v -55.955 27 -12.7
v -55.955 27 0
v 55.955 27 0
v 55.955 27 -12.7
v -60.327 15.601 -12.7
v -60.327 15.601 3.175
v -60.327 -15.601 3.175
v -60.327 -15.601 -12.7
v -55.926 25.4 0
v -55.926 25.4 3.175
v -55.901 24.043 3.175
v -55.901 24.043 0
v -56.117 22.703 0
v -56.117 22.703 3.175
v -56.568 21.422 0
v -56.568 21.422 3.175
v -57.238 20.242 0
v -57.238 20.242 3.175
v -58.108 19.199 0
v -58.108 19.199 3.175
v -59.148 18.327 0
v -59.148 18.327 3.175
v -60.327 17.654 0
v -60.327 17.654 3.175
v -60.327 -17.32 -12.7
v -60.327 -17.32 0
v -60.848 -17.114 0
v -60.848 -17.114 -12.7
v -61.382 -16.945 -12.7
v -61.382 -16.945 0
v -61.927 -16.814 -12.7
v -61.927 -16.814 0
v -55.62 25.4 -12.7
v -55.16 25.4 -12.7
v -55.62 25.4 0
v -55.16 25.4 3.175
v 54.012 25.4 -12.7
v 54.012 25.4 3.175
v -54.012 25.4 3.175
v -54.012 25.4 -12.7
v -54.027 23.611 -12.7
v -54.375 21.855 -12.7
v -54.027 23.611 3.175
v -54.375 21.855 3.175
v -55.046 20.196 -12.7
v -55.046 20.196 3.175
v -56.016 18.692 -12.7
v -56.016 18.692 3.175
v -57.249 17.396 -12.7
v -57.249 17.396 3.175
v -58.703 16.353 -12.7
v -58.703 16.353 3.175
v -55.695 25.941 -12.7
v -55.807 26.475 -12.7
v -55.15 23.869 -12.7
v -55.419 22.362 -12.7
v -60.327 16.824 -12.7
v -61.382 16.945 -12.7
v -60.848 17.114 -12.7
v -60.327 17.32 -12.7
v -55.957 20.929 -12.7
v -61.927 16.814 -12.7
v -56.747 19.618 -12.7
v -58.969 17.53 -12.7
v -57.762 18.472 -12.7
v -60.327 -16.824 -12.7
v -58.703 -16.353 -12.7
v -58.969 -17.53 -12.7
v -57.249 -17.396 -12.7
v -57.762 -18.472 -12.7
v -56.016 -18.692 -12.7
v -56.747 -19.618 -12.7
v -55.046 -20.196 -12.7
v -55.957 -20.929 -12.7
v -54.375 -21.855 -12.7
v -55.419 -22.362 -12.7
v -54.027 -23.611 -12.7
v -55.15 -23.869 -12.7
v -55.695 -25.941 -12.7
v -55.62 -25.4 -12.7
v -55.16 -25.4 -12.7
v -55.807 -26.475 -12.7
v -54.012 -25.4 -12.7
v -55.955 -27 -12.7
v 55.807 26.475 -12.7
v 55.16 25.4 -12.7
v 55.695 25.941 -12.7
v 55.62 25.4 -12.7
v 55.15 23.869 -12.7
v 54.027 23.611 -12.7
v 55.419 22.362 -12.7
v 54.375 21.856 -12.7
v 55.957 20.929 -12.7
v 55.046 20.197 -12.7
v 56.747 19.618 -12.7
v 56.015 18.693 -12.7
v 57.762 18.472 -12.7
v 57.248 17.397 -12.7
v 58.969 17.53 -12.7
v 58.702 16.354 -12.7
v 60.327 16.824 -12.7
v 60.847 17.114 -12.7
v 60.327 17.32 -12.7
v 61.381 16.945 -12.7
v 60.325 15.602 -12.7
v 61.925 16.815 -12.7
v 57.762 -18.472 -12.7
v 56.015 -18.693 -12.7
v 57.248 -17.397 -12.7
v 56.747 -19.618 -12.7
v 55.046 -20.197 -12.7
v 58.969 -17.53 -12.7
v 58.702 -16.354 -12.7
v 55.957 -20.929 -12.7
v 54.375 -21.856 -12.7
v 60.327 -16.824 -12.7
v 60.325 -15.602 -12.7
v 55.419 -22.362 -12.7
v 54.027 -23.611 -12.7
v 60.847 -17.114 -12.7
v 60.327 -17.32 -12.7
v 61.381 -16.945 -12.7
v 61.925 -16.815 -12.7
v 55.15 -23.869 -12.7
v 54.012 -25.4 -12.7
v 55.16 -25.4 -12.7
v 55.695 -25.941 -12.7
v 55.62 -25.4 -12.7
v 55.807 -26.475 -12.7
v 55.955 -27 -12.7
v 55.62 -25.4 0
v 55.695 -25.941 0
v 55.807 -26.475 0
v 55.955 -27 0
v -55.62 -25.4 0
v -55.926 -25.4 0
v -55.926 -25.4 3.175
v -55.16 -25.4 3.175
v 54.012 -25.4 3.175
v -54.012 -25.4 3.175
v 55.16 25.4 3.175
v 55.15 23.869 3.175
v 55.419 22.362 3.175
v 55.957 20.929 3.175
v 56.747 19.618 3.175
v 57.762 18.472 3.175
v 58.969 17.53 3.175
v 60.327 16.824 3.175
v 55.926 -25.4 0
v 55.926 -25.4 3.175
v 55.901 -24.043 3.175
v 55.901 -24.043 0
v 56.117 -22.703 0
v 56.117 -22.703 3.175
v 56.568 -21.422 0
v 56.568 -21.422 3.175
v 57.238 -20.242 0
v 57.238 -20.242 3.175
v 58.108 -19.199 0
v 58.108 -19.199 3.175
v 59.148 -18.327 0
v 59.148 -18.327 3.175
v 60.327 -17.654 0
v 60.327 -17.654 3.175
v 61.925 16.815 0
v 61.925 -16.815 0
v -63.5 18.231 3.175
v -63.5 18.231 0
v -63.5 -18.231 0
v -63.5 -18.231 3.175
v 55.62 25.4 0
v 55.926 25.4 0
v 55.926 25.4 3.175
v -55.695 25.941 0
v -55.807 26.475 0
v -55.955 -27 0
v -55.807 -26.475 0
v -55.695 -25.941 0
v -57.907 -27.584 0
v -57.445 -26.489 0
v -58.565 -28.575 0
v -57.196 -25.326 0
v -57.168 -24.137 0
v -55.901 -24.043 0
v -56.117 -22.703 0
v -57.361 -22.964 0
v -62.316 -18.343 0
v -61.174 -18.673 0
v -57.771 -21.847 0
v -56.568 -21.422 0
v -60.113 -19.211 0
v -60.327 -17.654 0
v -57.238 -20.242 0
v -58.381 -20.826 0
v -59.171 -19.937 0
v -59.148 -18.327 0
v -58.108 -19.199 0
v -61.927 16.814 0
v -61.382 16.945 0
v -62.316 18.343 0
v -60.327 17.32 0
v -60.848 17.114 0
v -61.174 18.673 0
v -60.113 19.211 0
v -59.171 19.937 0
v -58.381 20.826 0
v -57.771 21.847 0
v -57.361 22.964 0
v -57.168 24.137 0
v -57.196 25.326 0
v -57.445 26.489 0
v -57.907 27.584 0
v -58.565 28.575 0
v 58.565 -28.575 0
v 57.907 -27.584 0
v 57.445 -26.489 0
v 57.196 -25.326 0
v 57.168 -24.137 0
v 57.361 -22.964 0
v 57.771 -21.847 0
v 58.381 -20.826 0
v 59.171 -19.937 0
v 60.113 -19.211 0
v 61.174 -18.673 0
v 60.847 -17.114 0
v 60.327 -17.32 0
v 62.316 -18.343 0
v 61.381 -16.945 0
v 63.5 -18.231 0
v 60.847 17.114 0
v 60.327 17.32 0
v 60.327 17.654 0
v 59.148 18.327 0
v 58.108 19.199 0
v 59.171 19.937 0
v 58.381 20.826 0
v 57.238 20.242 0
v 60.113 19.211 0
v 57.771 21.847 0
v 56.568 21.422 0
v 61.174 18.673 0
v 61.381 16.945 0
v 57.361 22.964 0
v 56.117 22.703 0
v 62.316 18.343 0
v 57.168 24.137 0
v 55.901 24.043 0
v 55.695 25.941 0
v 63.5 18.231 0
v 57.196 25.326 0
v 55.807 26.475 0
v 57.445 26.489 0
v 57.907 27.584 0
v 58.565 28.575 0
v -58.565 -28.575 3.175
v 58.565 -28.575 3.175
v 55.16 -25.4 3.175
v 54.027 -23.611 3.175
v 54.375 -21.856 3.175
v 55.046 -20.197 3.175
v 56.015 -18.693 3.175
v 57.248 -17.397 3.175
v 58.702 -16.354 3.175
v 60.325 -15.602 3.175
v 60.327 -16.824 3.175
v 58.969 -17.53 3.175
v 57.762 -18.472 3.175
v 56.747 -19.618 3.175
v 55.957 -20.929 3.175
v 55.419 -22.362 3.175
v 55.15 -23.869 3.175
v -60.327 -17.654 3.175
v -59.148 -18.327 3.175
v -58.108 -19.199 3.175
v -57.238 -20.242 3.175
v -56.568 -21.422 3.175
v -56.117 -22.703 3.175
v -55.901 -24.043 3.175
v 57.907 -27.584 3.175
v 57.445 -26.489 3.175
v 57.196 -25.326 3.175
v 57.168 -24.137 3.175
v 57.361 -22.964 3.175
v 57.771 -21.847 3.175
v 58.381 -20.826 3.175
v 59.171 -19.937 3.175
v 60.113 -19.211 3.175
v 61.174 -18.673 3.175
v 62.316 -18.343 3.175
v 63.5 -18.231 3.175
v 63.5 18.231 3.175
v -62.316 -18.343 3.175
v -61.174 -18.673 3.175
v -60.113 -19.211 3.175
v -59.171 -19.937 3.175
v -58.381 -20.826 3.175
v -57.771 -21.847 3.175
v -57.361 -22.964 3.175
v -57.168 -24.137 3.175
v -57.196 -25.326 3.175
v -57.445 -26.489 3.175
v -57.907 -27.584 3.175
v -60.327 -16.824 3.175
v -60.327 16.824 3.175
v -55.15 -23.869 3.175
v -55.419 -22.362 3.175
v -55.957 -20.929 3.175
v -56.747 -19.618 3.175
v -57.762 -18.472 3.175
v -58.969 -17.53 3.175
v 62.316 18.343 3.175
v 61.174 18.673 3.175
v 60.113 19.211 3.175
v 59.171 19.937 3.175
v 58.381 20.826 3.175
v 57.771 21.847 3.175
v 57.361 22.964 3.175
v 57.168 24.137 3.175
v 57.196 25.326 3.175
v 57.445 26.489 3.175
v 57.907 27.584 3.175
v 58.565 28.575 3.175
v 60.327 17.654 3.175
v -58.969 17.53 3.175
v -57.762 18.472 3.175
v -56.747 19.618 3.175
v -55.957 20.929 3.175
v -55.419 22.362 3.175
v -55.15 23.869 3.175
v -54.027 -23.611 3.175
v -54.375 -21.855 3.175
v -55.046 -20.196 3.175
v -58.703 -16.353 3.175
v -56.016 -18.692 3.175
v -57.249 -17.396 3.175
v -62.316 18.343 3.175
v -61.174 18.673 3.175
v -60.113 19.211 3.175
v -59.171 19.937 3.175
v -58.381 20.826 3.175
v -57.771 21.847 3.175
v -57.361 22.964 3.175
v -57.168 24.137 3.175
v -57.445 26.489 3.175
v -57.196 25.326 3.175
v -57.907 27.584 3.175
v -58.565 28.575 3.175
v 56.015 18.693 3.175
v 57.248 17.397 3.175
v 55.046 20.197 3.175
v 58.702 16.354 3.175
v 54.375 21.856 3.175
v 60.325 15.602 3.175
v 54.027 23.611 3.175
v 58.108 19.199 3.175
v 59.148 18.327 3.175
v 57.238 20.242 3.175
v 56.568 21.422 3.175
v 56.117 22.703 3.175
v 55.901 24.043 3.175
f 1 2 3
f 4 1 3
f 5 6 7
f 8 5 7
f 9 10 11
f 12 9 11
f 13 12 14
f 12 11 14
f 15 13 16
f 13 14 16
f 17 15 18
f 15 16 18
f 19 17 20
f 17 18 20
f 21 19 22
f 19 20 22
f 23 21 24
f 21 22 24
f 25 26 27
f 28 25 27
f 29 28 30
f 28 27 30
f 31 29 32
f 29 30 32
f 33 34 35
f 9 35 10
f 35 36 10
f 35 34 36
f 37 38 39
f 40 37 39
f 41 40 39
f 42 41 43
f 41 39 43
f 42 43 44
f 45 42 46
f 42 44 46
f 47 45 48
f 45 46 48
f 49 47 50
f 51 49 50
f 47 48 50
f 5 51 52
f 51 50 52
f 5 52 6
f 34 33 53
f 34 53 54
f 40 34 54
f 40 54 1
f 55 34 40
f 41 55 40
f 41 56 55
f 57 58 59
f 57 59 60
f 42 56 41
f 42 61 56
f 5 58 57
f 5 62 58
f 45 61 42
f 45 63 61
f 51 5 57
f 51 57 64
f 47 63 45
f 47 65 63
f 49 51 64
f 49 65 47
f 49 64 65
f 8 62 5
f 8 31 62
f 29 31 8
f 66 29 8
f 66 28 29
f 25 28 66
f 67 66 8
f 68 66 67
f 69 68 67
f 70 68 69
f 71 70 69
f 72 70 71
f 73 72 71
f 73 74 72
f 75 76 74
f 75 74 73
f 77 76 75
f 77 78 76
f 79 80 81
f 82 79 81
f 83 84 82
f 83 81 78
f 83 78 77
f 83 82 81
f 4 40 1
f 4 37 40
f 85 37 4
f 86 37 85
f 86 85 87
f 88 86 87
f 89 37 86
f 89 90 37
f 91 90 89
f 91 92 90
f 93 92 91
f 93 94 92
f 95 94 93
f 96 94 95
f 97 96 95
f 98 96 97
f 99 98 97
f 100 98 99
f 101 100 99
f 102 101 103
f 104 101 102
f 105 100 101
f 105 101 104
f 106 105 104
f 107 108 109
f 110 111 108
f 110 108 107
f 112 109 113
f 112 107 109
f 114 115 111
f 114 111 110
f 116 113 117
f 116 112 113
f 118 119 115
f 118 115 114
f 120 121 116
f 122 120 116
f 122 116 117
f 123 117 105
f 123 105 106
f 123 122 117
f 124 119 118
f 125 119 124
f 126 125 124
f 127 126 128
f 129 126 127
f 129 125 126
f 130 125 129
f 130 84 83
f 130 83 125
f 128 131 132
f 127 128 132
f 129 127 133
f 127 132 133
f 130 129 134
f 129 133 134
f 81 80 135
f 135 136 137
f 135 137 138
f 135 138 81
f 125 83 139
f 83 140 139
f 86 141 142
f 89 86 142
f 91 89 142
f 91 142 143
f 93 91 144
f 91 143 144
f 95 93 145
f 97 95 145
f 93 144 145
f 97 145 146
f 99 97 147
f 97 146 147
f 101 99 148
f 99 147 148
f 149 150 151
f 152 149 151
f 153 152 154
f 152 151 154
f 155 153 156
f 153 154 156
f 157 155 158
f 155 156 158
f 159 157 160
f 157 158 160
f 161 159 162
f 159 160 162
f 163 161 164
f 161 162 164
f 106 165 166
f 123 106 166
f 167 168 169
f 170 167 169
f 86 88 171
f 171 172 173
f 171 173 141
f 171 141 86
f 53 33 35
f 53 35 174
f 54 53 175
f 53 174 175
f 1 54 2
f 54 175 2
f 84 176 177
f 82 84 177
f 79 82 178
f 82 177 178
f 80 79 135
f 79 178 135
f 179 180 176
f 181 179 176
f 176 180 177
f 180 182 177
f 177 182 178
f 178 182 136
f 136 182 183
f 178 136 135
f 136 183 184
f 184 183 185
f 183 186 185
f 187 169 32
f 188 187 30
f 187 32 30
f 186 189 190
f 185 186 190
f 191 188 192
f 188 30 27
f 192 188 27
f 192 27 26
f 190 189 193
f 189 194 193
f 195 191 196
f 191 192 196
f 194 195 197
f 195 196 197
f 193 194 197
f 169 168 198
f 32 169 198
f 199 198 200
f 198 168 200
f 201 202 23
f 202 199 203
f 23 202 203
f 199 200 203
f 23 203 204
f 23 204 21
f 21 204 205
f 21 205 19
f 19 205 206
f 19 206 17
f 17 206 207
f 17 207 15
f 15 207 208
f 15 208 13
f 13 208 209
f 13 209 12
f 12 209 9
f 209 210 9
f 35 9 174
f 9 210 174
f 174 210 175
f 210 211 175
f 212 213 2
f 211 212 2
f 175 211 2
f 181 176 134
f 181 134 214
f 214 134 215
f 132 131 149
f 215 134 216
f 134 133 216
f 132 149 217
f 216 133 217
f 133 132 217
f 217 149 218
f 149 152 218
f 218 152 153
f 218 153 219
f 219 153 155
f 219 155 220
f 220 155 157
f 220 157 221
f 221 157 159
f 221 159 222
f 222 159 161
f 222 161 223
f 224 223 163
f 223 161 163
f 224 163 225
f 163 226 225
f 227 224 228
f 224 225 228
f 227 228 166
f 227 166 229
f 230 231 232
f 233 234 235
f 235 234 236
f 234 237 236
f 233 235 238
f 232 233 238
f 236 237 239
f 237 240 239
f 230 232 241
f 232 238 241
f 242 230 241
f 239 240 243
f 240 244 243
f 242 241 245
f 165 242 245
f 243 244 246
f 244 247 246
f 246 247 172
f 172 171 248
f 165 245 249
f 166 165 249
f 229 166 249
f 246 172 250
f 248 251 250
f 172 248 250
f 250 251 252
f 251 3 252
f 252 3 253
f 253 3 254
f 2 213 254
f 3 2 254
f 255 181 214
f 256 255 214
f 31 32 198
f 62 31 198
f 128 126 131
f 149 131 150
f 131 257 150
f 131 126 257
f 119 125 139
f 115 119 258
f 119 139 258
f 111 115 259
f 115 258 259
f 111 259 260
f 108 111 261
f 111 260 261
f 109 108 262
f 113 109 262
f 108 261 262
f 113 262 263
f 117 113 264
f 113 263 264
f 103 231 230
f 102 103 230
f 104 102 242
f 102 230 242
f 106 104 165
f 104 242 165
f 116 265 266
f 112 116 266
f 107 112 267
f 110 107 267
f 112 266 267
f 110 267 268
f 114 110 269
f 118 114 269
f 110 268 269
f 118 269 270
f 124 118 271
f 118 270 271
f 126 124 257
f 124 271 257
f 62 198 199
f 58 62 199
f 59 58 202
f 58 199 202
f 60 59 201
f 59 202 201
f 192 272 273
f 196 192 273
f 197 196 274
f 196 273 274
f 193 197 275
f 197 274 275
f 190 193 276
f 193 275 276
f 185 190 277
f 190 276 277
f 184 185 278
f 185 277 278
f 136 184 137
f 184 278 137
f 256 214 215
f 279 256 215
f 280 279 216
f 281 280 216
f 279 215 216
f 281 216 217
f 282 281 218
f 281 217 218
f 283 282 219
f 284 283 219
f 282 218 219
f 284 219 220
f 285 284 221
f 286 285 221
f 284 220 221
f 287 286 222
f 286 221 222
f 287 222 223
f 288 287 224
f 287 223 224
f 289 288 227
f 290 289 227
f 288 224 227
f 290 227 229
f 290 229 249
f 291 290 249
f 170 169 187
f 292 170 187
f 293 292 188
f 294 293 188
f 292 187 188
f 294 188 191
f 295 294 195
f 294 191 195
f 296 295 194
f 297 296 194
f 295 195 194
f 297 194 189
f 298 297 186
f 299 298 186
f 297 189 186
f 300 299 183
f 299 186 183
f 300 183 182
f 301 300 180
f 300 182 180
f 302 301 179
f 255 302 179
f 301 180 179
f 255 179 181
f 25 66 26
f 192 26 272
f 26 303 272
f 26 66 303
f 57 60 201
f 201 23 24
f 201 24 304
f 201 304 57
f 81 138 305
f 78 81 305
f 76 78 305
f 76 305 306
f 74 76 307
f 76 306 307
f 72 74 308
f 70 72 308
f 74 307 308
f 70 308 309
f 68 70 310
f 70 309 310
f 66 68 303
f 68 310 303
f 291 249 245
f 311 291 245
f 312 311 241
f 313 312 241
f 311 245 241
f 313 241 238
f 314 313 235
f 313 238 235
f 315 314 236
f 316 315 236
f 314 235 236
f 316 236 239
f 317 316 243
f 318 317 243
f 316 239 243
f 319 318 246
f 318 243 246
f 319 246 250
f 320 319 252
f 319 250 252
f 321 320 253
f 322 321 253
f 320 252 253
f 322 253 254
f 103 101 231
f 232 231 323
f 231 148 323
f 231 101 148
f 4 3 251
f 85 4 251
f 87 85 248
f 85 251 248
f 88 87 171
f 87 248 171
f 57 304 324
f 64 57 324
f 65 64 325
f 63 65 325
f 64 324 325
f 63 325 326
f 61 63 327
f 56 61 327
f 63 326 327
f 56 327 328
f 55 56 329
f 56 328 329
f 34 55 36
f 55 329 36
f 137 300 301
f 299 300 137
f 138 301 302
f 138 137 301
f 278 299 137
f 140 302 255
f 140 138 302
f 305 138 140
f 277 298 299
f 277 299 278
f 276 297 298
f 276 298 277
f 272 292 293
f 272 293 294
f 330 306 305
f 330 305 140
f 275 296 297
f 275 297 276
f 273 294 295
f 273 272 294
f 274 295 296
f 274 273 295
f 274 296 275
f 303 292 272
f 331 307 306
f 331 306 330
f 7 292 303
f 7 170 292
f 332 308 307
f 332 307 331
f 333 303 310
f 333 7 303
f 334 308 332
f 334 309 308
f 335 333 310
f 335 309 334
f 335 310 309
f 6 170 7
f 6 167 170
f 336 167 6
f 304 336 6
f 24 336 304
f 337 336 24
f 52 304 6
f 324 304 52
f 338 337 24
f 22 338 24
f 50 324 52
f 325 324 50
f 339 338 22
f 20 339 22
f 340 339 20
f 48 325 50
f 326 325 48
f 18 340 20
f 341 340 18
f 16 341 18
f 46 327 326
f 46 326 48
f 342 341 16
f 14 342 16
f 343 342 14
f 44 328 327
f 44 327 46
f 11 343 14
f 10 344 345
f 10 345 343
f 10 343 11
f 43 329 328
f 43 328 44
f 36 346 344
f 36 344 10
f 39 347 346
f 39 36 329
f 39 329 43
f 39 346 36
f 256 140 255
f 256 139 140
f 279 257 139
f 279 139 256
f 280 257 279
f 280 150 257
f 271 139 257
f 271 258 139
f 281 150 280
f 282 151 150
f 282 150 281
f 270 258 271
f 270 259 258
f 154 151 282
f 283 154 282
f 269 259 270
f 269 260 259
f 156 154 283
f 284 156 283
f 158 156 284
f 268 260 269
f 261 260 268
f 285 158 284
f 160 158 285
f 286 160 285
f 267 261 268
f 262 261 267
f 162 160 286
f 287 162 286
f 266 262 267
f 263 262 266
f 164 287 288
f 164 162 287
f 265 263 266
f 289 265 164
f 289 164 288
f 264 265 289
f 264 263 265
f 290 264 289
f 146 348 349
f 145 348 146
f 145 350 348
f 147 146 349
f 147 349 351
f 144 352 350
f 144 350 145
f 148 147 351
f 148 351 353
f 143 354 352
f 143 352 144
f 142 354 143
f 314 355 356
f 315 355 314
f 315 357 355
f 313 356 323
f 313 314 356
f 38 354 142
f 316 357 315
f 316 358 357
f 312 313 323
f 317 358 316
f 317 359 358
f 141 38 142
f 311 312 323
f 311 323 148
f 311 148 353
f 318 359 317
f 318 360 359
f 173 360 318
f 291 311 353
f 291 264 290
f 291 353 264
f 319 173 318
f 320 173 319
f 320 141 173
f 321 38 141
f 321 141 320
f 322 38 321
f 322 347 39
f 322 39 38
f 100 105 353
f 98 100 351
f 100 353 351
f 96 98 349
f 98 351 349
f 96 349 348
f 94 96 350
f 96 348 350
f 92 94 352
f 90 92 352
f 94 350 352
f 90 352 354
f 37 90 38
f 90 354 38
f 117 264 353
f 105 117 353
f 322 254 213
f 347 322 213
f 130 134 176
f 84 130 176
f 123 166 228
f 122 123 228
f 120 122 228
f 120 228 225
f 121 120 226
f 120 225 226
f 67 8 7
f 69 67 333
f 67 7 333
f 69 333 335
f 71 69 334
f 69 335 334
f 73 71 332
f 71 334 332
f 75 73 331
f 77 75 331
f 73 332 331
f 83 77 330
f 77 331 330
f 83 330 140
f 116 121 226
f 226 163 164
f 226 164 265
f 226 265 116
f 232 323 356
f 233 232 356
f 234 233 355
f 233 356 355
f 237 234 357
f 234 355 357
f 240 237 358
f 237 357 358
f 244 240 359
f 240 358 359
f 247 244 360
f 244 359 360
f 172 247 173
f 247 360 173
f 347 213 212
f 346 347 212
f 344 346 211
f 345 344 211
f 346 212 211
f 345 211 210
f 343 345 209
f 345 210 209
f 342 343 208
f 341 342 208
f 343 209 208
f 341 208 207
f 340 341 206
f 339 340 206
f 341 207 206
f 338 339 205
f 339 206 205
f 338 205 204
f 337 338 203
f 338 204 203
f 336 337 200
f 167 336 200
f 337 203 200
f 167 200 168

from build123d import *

# Parameters (mm, degrees)
F1_DEPTH = 3.175
F3_DEPTH = 12.7
F5_DEPTH = 25.4


with BuildPart() as f1:
    # F0 (on Top) → F1 (new body)
    with BuildSketch(Plane.XY):
        with BuildLine():
            Line((-58.565236, -28.575), (58.565236, -28.575))
            ThreePointArc((58.565236, -28.575), (57.770772, -21.846928), (63.5, -18.231118))
            Line((63.5, -18.231118), (63.5, 18.231118))
            ThreePointArc((63.5, 18.231118), (57.770772, 21.846928), (58.565236, 28.575))
            Line((58.565236, 28.575), (-58.565236, 28.575))
            ThreePointArc((-58.565236, 28.575), (-57.770772, 21.846928), (-63.5, 18.231118))
            Line((-63.5, 18.231118), (-63.5, -18.231118))
            ThreePointArc((-63.5, -18.231118), (-57.770772, -21.846928), (-58.565236, -28.575))
        make_face()
        with BuildLine():
            ThreePointArc((-54.012243, -25.4), (-55.495439, -19.421566), (-60.326977, -15.600862))
            Line((-60.326977, -15.600862), (-60.326977, 15.600862))
            ThreePointArc((-60.326977, 15.600862), (-55.495439, 19.421566), (-54.012243, 25.4))
            Line((-54.012243, 25.4), (54.012243, 25.4))
            ThreePointArc((54.012243, 25.4), (55.494871, 19.422448), (60.325, 15.601561))
            Line((60.325, 15.601561), (60.325, -15.601561))
            ThreePointArc((60.325, -15.601561), (55.494871, -19.422448), (54.012243, -25.4))
            Line((54.012243, -25.4), (-54.012243, -25.4))
        make_face(mode=Mode.SUBTRACT)
    extrude(amount=F1_DEPTH)

    # F2 (on face) → F3 (join)
    with BuildSketch(Plane(origin=(0, 0, 0), x_dir=(1, 0, 0), z_dir=(0, 0, -1))):
        with BuildLine():
            ThreePointArc((55.955421, -27.0002), (56.664977, -20.573888), (61.9252, -16.814766))
            Line((61.9252, -16.814766), (61.9252, 16.814766))
            ThreePointArc((61.9252, 16.814766), (56.664977, 20.573888), (55.955421, 27.0002))
            Line((55.955421, 27.0002), (-55.955421, 27.0002))
            ThreePointArc((-55.955421, 27.0002), (-56.665487, 20.573018), (-61.927177, 16.814364))
            Line((-61.927177, 16.814364), (-61.927177, -16.814364))
            ThreePointArc((-61.927177, -16.814364), (-56.665487, -20.573018), (-55.955421, -27.0002))
            Line((-55.955421, -27.0002), (55.955421, -27.0002))
        make_face()
        with BuildLine():
            Line((-54.012243, 25.4), (54.012243, 25.4))
            ThreePointArc((54.012243, 25.4), (55.494871, 19.422448), (60.325, 15.601561))
            Line((60.325, 15.601561), (60.325, -15.601561))
            ThreePointArc((60.325, -15.601561), (55.494871, -19.422448), (54.012243, -25.4))
            Line((54.012243, -25.4), (-54.012243, -25.4))
            ThreePointArc((-54.012243, -25.4), (-55.495439, -19.421566), (-60.326977, -15.600862))
            Line((-60.326977, -15.600862), (-60.326977, 15.600862))
            ThreePointArc((-60.326977, 15.600862), (-55.495439, 19.421566), (-54.012243, 25.4))
        make_face(mode=Mode.SUBTRACT)
    extrude(amount=F3_DEPTH)

    # F4 (on face) → F5 (cut)
    with BuildSketch(Plane.XY.offset(3.175)):
        with BuildLine():
            ThreePointArc((-55.926105, 25.4), (-56.876639, 20.816906), (-60.326977, 17.654086))
            Line((-60.326977, 17.654086), (-60.326977, 16.823715))
            ThreePointArc((-60.326977, 16.823715), (-56.322288, 20.255613), (-55.160073, 25.4))
            Line((-55.160073, 25.4), (-55.926105, 25.4))
        make_face()
        with BuildLine():
            ThreePointArc((55.160073, 25.4), (56.322288, 20.255613), (60.326977, 16.823715))
            Line((60.326977, 16.823715), (60.326977, 17.654086))
            ThreePointArc((60.326977, 17.654086), (56.876639, 20.816906), (55.926105, 25.4))
            Line((55.926105, 25.4), (55.160073, 25.4))
        make_face()
        with BuildLine():
            ThreePointArc((-55.160073, -25.4), (-56.322288, -20.255613), (-60.326977, -16.823715))
            Line((-60.326977, -16.823715), (-60.326977, -17.654086))
            ThreePointArc((-60.326977, -17.654086), (-56.876639, -20.816906), (-55.926105, -25.4))
            Line((-55.926105, -25.4), (-55.160073, -25.4))
        make_face()
        with BuildLine():
            Line((60.326977, -17.654086), (60.326977, -16.823715))
            ThreePointArc((60.326977, -16.823715), (56.322288, -20.255613), (55.160073, -25.4))
            Line((55.160073, -25.4), (55.926105, -25.4))
            ThreePointArc((55.926105, -25.4), (56.876639, -20.816906), (60.326977, -17.654086))
        make_face()
    extrude(amount=-F5_DEPTH, mode=Mode.SUBTRACT)


solid = f1.part
